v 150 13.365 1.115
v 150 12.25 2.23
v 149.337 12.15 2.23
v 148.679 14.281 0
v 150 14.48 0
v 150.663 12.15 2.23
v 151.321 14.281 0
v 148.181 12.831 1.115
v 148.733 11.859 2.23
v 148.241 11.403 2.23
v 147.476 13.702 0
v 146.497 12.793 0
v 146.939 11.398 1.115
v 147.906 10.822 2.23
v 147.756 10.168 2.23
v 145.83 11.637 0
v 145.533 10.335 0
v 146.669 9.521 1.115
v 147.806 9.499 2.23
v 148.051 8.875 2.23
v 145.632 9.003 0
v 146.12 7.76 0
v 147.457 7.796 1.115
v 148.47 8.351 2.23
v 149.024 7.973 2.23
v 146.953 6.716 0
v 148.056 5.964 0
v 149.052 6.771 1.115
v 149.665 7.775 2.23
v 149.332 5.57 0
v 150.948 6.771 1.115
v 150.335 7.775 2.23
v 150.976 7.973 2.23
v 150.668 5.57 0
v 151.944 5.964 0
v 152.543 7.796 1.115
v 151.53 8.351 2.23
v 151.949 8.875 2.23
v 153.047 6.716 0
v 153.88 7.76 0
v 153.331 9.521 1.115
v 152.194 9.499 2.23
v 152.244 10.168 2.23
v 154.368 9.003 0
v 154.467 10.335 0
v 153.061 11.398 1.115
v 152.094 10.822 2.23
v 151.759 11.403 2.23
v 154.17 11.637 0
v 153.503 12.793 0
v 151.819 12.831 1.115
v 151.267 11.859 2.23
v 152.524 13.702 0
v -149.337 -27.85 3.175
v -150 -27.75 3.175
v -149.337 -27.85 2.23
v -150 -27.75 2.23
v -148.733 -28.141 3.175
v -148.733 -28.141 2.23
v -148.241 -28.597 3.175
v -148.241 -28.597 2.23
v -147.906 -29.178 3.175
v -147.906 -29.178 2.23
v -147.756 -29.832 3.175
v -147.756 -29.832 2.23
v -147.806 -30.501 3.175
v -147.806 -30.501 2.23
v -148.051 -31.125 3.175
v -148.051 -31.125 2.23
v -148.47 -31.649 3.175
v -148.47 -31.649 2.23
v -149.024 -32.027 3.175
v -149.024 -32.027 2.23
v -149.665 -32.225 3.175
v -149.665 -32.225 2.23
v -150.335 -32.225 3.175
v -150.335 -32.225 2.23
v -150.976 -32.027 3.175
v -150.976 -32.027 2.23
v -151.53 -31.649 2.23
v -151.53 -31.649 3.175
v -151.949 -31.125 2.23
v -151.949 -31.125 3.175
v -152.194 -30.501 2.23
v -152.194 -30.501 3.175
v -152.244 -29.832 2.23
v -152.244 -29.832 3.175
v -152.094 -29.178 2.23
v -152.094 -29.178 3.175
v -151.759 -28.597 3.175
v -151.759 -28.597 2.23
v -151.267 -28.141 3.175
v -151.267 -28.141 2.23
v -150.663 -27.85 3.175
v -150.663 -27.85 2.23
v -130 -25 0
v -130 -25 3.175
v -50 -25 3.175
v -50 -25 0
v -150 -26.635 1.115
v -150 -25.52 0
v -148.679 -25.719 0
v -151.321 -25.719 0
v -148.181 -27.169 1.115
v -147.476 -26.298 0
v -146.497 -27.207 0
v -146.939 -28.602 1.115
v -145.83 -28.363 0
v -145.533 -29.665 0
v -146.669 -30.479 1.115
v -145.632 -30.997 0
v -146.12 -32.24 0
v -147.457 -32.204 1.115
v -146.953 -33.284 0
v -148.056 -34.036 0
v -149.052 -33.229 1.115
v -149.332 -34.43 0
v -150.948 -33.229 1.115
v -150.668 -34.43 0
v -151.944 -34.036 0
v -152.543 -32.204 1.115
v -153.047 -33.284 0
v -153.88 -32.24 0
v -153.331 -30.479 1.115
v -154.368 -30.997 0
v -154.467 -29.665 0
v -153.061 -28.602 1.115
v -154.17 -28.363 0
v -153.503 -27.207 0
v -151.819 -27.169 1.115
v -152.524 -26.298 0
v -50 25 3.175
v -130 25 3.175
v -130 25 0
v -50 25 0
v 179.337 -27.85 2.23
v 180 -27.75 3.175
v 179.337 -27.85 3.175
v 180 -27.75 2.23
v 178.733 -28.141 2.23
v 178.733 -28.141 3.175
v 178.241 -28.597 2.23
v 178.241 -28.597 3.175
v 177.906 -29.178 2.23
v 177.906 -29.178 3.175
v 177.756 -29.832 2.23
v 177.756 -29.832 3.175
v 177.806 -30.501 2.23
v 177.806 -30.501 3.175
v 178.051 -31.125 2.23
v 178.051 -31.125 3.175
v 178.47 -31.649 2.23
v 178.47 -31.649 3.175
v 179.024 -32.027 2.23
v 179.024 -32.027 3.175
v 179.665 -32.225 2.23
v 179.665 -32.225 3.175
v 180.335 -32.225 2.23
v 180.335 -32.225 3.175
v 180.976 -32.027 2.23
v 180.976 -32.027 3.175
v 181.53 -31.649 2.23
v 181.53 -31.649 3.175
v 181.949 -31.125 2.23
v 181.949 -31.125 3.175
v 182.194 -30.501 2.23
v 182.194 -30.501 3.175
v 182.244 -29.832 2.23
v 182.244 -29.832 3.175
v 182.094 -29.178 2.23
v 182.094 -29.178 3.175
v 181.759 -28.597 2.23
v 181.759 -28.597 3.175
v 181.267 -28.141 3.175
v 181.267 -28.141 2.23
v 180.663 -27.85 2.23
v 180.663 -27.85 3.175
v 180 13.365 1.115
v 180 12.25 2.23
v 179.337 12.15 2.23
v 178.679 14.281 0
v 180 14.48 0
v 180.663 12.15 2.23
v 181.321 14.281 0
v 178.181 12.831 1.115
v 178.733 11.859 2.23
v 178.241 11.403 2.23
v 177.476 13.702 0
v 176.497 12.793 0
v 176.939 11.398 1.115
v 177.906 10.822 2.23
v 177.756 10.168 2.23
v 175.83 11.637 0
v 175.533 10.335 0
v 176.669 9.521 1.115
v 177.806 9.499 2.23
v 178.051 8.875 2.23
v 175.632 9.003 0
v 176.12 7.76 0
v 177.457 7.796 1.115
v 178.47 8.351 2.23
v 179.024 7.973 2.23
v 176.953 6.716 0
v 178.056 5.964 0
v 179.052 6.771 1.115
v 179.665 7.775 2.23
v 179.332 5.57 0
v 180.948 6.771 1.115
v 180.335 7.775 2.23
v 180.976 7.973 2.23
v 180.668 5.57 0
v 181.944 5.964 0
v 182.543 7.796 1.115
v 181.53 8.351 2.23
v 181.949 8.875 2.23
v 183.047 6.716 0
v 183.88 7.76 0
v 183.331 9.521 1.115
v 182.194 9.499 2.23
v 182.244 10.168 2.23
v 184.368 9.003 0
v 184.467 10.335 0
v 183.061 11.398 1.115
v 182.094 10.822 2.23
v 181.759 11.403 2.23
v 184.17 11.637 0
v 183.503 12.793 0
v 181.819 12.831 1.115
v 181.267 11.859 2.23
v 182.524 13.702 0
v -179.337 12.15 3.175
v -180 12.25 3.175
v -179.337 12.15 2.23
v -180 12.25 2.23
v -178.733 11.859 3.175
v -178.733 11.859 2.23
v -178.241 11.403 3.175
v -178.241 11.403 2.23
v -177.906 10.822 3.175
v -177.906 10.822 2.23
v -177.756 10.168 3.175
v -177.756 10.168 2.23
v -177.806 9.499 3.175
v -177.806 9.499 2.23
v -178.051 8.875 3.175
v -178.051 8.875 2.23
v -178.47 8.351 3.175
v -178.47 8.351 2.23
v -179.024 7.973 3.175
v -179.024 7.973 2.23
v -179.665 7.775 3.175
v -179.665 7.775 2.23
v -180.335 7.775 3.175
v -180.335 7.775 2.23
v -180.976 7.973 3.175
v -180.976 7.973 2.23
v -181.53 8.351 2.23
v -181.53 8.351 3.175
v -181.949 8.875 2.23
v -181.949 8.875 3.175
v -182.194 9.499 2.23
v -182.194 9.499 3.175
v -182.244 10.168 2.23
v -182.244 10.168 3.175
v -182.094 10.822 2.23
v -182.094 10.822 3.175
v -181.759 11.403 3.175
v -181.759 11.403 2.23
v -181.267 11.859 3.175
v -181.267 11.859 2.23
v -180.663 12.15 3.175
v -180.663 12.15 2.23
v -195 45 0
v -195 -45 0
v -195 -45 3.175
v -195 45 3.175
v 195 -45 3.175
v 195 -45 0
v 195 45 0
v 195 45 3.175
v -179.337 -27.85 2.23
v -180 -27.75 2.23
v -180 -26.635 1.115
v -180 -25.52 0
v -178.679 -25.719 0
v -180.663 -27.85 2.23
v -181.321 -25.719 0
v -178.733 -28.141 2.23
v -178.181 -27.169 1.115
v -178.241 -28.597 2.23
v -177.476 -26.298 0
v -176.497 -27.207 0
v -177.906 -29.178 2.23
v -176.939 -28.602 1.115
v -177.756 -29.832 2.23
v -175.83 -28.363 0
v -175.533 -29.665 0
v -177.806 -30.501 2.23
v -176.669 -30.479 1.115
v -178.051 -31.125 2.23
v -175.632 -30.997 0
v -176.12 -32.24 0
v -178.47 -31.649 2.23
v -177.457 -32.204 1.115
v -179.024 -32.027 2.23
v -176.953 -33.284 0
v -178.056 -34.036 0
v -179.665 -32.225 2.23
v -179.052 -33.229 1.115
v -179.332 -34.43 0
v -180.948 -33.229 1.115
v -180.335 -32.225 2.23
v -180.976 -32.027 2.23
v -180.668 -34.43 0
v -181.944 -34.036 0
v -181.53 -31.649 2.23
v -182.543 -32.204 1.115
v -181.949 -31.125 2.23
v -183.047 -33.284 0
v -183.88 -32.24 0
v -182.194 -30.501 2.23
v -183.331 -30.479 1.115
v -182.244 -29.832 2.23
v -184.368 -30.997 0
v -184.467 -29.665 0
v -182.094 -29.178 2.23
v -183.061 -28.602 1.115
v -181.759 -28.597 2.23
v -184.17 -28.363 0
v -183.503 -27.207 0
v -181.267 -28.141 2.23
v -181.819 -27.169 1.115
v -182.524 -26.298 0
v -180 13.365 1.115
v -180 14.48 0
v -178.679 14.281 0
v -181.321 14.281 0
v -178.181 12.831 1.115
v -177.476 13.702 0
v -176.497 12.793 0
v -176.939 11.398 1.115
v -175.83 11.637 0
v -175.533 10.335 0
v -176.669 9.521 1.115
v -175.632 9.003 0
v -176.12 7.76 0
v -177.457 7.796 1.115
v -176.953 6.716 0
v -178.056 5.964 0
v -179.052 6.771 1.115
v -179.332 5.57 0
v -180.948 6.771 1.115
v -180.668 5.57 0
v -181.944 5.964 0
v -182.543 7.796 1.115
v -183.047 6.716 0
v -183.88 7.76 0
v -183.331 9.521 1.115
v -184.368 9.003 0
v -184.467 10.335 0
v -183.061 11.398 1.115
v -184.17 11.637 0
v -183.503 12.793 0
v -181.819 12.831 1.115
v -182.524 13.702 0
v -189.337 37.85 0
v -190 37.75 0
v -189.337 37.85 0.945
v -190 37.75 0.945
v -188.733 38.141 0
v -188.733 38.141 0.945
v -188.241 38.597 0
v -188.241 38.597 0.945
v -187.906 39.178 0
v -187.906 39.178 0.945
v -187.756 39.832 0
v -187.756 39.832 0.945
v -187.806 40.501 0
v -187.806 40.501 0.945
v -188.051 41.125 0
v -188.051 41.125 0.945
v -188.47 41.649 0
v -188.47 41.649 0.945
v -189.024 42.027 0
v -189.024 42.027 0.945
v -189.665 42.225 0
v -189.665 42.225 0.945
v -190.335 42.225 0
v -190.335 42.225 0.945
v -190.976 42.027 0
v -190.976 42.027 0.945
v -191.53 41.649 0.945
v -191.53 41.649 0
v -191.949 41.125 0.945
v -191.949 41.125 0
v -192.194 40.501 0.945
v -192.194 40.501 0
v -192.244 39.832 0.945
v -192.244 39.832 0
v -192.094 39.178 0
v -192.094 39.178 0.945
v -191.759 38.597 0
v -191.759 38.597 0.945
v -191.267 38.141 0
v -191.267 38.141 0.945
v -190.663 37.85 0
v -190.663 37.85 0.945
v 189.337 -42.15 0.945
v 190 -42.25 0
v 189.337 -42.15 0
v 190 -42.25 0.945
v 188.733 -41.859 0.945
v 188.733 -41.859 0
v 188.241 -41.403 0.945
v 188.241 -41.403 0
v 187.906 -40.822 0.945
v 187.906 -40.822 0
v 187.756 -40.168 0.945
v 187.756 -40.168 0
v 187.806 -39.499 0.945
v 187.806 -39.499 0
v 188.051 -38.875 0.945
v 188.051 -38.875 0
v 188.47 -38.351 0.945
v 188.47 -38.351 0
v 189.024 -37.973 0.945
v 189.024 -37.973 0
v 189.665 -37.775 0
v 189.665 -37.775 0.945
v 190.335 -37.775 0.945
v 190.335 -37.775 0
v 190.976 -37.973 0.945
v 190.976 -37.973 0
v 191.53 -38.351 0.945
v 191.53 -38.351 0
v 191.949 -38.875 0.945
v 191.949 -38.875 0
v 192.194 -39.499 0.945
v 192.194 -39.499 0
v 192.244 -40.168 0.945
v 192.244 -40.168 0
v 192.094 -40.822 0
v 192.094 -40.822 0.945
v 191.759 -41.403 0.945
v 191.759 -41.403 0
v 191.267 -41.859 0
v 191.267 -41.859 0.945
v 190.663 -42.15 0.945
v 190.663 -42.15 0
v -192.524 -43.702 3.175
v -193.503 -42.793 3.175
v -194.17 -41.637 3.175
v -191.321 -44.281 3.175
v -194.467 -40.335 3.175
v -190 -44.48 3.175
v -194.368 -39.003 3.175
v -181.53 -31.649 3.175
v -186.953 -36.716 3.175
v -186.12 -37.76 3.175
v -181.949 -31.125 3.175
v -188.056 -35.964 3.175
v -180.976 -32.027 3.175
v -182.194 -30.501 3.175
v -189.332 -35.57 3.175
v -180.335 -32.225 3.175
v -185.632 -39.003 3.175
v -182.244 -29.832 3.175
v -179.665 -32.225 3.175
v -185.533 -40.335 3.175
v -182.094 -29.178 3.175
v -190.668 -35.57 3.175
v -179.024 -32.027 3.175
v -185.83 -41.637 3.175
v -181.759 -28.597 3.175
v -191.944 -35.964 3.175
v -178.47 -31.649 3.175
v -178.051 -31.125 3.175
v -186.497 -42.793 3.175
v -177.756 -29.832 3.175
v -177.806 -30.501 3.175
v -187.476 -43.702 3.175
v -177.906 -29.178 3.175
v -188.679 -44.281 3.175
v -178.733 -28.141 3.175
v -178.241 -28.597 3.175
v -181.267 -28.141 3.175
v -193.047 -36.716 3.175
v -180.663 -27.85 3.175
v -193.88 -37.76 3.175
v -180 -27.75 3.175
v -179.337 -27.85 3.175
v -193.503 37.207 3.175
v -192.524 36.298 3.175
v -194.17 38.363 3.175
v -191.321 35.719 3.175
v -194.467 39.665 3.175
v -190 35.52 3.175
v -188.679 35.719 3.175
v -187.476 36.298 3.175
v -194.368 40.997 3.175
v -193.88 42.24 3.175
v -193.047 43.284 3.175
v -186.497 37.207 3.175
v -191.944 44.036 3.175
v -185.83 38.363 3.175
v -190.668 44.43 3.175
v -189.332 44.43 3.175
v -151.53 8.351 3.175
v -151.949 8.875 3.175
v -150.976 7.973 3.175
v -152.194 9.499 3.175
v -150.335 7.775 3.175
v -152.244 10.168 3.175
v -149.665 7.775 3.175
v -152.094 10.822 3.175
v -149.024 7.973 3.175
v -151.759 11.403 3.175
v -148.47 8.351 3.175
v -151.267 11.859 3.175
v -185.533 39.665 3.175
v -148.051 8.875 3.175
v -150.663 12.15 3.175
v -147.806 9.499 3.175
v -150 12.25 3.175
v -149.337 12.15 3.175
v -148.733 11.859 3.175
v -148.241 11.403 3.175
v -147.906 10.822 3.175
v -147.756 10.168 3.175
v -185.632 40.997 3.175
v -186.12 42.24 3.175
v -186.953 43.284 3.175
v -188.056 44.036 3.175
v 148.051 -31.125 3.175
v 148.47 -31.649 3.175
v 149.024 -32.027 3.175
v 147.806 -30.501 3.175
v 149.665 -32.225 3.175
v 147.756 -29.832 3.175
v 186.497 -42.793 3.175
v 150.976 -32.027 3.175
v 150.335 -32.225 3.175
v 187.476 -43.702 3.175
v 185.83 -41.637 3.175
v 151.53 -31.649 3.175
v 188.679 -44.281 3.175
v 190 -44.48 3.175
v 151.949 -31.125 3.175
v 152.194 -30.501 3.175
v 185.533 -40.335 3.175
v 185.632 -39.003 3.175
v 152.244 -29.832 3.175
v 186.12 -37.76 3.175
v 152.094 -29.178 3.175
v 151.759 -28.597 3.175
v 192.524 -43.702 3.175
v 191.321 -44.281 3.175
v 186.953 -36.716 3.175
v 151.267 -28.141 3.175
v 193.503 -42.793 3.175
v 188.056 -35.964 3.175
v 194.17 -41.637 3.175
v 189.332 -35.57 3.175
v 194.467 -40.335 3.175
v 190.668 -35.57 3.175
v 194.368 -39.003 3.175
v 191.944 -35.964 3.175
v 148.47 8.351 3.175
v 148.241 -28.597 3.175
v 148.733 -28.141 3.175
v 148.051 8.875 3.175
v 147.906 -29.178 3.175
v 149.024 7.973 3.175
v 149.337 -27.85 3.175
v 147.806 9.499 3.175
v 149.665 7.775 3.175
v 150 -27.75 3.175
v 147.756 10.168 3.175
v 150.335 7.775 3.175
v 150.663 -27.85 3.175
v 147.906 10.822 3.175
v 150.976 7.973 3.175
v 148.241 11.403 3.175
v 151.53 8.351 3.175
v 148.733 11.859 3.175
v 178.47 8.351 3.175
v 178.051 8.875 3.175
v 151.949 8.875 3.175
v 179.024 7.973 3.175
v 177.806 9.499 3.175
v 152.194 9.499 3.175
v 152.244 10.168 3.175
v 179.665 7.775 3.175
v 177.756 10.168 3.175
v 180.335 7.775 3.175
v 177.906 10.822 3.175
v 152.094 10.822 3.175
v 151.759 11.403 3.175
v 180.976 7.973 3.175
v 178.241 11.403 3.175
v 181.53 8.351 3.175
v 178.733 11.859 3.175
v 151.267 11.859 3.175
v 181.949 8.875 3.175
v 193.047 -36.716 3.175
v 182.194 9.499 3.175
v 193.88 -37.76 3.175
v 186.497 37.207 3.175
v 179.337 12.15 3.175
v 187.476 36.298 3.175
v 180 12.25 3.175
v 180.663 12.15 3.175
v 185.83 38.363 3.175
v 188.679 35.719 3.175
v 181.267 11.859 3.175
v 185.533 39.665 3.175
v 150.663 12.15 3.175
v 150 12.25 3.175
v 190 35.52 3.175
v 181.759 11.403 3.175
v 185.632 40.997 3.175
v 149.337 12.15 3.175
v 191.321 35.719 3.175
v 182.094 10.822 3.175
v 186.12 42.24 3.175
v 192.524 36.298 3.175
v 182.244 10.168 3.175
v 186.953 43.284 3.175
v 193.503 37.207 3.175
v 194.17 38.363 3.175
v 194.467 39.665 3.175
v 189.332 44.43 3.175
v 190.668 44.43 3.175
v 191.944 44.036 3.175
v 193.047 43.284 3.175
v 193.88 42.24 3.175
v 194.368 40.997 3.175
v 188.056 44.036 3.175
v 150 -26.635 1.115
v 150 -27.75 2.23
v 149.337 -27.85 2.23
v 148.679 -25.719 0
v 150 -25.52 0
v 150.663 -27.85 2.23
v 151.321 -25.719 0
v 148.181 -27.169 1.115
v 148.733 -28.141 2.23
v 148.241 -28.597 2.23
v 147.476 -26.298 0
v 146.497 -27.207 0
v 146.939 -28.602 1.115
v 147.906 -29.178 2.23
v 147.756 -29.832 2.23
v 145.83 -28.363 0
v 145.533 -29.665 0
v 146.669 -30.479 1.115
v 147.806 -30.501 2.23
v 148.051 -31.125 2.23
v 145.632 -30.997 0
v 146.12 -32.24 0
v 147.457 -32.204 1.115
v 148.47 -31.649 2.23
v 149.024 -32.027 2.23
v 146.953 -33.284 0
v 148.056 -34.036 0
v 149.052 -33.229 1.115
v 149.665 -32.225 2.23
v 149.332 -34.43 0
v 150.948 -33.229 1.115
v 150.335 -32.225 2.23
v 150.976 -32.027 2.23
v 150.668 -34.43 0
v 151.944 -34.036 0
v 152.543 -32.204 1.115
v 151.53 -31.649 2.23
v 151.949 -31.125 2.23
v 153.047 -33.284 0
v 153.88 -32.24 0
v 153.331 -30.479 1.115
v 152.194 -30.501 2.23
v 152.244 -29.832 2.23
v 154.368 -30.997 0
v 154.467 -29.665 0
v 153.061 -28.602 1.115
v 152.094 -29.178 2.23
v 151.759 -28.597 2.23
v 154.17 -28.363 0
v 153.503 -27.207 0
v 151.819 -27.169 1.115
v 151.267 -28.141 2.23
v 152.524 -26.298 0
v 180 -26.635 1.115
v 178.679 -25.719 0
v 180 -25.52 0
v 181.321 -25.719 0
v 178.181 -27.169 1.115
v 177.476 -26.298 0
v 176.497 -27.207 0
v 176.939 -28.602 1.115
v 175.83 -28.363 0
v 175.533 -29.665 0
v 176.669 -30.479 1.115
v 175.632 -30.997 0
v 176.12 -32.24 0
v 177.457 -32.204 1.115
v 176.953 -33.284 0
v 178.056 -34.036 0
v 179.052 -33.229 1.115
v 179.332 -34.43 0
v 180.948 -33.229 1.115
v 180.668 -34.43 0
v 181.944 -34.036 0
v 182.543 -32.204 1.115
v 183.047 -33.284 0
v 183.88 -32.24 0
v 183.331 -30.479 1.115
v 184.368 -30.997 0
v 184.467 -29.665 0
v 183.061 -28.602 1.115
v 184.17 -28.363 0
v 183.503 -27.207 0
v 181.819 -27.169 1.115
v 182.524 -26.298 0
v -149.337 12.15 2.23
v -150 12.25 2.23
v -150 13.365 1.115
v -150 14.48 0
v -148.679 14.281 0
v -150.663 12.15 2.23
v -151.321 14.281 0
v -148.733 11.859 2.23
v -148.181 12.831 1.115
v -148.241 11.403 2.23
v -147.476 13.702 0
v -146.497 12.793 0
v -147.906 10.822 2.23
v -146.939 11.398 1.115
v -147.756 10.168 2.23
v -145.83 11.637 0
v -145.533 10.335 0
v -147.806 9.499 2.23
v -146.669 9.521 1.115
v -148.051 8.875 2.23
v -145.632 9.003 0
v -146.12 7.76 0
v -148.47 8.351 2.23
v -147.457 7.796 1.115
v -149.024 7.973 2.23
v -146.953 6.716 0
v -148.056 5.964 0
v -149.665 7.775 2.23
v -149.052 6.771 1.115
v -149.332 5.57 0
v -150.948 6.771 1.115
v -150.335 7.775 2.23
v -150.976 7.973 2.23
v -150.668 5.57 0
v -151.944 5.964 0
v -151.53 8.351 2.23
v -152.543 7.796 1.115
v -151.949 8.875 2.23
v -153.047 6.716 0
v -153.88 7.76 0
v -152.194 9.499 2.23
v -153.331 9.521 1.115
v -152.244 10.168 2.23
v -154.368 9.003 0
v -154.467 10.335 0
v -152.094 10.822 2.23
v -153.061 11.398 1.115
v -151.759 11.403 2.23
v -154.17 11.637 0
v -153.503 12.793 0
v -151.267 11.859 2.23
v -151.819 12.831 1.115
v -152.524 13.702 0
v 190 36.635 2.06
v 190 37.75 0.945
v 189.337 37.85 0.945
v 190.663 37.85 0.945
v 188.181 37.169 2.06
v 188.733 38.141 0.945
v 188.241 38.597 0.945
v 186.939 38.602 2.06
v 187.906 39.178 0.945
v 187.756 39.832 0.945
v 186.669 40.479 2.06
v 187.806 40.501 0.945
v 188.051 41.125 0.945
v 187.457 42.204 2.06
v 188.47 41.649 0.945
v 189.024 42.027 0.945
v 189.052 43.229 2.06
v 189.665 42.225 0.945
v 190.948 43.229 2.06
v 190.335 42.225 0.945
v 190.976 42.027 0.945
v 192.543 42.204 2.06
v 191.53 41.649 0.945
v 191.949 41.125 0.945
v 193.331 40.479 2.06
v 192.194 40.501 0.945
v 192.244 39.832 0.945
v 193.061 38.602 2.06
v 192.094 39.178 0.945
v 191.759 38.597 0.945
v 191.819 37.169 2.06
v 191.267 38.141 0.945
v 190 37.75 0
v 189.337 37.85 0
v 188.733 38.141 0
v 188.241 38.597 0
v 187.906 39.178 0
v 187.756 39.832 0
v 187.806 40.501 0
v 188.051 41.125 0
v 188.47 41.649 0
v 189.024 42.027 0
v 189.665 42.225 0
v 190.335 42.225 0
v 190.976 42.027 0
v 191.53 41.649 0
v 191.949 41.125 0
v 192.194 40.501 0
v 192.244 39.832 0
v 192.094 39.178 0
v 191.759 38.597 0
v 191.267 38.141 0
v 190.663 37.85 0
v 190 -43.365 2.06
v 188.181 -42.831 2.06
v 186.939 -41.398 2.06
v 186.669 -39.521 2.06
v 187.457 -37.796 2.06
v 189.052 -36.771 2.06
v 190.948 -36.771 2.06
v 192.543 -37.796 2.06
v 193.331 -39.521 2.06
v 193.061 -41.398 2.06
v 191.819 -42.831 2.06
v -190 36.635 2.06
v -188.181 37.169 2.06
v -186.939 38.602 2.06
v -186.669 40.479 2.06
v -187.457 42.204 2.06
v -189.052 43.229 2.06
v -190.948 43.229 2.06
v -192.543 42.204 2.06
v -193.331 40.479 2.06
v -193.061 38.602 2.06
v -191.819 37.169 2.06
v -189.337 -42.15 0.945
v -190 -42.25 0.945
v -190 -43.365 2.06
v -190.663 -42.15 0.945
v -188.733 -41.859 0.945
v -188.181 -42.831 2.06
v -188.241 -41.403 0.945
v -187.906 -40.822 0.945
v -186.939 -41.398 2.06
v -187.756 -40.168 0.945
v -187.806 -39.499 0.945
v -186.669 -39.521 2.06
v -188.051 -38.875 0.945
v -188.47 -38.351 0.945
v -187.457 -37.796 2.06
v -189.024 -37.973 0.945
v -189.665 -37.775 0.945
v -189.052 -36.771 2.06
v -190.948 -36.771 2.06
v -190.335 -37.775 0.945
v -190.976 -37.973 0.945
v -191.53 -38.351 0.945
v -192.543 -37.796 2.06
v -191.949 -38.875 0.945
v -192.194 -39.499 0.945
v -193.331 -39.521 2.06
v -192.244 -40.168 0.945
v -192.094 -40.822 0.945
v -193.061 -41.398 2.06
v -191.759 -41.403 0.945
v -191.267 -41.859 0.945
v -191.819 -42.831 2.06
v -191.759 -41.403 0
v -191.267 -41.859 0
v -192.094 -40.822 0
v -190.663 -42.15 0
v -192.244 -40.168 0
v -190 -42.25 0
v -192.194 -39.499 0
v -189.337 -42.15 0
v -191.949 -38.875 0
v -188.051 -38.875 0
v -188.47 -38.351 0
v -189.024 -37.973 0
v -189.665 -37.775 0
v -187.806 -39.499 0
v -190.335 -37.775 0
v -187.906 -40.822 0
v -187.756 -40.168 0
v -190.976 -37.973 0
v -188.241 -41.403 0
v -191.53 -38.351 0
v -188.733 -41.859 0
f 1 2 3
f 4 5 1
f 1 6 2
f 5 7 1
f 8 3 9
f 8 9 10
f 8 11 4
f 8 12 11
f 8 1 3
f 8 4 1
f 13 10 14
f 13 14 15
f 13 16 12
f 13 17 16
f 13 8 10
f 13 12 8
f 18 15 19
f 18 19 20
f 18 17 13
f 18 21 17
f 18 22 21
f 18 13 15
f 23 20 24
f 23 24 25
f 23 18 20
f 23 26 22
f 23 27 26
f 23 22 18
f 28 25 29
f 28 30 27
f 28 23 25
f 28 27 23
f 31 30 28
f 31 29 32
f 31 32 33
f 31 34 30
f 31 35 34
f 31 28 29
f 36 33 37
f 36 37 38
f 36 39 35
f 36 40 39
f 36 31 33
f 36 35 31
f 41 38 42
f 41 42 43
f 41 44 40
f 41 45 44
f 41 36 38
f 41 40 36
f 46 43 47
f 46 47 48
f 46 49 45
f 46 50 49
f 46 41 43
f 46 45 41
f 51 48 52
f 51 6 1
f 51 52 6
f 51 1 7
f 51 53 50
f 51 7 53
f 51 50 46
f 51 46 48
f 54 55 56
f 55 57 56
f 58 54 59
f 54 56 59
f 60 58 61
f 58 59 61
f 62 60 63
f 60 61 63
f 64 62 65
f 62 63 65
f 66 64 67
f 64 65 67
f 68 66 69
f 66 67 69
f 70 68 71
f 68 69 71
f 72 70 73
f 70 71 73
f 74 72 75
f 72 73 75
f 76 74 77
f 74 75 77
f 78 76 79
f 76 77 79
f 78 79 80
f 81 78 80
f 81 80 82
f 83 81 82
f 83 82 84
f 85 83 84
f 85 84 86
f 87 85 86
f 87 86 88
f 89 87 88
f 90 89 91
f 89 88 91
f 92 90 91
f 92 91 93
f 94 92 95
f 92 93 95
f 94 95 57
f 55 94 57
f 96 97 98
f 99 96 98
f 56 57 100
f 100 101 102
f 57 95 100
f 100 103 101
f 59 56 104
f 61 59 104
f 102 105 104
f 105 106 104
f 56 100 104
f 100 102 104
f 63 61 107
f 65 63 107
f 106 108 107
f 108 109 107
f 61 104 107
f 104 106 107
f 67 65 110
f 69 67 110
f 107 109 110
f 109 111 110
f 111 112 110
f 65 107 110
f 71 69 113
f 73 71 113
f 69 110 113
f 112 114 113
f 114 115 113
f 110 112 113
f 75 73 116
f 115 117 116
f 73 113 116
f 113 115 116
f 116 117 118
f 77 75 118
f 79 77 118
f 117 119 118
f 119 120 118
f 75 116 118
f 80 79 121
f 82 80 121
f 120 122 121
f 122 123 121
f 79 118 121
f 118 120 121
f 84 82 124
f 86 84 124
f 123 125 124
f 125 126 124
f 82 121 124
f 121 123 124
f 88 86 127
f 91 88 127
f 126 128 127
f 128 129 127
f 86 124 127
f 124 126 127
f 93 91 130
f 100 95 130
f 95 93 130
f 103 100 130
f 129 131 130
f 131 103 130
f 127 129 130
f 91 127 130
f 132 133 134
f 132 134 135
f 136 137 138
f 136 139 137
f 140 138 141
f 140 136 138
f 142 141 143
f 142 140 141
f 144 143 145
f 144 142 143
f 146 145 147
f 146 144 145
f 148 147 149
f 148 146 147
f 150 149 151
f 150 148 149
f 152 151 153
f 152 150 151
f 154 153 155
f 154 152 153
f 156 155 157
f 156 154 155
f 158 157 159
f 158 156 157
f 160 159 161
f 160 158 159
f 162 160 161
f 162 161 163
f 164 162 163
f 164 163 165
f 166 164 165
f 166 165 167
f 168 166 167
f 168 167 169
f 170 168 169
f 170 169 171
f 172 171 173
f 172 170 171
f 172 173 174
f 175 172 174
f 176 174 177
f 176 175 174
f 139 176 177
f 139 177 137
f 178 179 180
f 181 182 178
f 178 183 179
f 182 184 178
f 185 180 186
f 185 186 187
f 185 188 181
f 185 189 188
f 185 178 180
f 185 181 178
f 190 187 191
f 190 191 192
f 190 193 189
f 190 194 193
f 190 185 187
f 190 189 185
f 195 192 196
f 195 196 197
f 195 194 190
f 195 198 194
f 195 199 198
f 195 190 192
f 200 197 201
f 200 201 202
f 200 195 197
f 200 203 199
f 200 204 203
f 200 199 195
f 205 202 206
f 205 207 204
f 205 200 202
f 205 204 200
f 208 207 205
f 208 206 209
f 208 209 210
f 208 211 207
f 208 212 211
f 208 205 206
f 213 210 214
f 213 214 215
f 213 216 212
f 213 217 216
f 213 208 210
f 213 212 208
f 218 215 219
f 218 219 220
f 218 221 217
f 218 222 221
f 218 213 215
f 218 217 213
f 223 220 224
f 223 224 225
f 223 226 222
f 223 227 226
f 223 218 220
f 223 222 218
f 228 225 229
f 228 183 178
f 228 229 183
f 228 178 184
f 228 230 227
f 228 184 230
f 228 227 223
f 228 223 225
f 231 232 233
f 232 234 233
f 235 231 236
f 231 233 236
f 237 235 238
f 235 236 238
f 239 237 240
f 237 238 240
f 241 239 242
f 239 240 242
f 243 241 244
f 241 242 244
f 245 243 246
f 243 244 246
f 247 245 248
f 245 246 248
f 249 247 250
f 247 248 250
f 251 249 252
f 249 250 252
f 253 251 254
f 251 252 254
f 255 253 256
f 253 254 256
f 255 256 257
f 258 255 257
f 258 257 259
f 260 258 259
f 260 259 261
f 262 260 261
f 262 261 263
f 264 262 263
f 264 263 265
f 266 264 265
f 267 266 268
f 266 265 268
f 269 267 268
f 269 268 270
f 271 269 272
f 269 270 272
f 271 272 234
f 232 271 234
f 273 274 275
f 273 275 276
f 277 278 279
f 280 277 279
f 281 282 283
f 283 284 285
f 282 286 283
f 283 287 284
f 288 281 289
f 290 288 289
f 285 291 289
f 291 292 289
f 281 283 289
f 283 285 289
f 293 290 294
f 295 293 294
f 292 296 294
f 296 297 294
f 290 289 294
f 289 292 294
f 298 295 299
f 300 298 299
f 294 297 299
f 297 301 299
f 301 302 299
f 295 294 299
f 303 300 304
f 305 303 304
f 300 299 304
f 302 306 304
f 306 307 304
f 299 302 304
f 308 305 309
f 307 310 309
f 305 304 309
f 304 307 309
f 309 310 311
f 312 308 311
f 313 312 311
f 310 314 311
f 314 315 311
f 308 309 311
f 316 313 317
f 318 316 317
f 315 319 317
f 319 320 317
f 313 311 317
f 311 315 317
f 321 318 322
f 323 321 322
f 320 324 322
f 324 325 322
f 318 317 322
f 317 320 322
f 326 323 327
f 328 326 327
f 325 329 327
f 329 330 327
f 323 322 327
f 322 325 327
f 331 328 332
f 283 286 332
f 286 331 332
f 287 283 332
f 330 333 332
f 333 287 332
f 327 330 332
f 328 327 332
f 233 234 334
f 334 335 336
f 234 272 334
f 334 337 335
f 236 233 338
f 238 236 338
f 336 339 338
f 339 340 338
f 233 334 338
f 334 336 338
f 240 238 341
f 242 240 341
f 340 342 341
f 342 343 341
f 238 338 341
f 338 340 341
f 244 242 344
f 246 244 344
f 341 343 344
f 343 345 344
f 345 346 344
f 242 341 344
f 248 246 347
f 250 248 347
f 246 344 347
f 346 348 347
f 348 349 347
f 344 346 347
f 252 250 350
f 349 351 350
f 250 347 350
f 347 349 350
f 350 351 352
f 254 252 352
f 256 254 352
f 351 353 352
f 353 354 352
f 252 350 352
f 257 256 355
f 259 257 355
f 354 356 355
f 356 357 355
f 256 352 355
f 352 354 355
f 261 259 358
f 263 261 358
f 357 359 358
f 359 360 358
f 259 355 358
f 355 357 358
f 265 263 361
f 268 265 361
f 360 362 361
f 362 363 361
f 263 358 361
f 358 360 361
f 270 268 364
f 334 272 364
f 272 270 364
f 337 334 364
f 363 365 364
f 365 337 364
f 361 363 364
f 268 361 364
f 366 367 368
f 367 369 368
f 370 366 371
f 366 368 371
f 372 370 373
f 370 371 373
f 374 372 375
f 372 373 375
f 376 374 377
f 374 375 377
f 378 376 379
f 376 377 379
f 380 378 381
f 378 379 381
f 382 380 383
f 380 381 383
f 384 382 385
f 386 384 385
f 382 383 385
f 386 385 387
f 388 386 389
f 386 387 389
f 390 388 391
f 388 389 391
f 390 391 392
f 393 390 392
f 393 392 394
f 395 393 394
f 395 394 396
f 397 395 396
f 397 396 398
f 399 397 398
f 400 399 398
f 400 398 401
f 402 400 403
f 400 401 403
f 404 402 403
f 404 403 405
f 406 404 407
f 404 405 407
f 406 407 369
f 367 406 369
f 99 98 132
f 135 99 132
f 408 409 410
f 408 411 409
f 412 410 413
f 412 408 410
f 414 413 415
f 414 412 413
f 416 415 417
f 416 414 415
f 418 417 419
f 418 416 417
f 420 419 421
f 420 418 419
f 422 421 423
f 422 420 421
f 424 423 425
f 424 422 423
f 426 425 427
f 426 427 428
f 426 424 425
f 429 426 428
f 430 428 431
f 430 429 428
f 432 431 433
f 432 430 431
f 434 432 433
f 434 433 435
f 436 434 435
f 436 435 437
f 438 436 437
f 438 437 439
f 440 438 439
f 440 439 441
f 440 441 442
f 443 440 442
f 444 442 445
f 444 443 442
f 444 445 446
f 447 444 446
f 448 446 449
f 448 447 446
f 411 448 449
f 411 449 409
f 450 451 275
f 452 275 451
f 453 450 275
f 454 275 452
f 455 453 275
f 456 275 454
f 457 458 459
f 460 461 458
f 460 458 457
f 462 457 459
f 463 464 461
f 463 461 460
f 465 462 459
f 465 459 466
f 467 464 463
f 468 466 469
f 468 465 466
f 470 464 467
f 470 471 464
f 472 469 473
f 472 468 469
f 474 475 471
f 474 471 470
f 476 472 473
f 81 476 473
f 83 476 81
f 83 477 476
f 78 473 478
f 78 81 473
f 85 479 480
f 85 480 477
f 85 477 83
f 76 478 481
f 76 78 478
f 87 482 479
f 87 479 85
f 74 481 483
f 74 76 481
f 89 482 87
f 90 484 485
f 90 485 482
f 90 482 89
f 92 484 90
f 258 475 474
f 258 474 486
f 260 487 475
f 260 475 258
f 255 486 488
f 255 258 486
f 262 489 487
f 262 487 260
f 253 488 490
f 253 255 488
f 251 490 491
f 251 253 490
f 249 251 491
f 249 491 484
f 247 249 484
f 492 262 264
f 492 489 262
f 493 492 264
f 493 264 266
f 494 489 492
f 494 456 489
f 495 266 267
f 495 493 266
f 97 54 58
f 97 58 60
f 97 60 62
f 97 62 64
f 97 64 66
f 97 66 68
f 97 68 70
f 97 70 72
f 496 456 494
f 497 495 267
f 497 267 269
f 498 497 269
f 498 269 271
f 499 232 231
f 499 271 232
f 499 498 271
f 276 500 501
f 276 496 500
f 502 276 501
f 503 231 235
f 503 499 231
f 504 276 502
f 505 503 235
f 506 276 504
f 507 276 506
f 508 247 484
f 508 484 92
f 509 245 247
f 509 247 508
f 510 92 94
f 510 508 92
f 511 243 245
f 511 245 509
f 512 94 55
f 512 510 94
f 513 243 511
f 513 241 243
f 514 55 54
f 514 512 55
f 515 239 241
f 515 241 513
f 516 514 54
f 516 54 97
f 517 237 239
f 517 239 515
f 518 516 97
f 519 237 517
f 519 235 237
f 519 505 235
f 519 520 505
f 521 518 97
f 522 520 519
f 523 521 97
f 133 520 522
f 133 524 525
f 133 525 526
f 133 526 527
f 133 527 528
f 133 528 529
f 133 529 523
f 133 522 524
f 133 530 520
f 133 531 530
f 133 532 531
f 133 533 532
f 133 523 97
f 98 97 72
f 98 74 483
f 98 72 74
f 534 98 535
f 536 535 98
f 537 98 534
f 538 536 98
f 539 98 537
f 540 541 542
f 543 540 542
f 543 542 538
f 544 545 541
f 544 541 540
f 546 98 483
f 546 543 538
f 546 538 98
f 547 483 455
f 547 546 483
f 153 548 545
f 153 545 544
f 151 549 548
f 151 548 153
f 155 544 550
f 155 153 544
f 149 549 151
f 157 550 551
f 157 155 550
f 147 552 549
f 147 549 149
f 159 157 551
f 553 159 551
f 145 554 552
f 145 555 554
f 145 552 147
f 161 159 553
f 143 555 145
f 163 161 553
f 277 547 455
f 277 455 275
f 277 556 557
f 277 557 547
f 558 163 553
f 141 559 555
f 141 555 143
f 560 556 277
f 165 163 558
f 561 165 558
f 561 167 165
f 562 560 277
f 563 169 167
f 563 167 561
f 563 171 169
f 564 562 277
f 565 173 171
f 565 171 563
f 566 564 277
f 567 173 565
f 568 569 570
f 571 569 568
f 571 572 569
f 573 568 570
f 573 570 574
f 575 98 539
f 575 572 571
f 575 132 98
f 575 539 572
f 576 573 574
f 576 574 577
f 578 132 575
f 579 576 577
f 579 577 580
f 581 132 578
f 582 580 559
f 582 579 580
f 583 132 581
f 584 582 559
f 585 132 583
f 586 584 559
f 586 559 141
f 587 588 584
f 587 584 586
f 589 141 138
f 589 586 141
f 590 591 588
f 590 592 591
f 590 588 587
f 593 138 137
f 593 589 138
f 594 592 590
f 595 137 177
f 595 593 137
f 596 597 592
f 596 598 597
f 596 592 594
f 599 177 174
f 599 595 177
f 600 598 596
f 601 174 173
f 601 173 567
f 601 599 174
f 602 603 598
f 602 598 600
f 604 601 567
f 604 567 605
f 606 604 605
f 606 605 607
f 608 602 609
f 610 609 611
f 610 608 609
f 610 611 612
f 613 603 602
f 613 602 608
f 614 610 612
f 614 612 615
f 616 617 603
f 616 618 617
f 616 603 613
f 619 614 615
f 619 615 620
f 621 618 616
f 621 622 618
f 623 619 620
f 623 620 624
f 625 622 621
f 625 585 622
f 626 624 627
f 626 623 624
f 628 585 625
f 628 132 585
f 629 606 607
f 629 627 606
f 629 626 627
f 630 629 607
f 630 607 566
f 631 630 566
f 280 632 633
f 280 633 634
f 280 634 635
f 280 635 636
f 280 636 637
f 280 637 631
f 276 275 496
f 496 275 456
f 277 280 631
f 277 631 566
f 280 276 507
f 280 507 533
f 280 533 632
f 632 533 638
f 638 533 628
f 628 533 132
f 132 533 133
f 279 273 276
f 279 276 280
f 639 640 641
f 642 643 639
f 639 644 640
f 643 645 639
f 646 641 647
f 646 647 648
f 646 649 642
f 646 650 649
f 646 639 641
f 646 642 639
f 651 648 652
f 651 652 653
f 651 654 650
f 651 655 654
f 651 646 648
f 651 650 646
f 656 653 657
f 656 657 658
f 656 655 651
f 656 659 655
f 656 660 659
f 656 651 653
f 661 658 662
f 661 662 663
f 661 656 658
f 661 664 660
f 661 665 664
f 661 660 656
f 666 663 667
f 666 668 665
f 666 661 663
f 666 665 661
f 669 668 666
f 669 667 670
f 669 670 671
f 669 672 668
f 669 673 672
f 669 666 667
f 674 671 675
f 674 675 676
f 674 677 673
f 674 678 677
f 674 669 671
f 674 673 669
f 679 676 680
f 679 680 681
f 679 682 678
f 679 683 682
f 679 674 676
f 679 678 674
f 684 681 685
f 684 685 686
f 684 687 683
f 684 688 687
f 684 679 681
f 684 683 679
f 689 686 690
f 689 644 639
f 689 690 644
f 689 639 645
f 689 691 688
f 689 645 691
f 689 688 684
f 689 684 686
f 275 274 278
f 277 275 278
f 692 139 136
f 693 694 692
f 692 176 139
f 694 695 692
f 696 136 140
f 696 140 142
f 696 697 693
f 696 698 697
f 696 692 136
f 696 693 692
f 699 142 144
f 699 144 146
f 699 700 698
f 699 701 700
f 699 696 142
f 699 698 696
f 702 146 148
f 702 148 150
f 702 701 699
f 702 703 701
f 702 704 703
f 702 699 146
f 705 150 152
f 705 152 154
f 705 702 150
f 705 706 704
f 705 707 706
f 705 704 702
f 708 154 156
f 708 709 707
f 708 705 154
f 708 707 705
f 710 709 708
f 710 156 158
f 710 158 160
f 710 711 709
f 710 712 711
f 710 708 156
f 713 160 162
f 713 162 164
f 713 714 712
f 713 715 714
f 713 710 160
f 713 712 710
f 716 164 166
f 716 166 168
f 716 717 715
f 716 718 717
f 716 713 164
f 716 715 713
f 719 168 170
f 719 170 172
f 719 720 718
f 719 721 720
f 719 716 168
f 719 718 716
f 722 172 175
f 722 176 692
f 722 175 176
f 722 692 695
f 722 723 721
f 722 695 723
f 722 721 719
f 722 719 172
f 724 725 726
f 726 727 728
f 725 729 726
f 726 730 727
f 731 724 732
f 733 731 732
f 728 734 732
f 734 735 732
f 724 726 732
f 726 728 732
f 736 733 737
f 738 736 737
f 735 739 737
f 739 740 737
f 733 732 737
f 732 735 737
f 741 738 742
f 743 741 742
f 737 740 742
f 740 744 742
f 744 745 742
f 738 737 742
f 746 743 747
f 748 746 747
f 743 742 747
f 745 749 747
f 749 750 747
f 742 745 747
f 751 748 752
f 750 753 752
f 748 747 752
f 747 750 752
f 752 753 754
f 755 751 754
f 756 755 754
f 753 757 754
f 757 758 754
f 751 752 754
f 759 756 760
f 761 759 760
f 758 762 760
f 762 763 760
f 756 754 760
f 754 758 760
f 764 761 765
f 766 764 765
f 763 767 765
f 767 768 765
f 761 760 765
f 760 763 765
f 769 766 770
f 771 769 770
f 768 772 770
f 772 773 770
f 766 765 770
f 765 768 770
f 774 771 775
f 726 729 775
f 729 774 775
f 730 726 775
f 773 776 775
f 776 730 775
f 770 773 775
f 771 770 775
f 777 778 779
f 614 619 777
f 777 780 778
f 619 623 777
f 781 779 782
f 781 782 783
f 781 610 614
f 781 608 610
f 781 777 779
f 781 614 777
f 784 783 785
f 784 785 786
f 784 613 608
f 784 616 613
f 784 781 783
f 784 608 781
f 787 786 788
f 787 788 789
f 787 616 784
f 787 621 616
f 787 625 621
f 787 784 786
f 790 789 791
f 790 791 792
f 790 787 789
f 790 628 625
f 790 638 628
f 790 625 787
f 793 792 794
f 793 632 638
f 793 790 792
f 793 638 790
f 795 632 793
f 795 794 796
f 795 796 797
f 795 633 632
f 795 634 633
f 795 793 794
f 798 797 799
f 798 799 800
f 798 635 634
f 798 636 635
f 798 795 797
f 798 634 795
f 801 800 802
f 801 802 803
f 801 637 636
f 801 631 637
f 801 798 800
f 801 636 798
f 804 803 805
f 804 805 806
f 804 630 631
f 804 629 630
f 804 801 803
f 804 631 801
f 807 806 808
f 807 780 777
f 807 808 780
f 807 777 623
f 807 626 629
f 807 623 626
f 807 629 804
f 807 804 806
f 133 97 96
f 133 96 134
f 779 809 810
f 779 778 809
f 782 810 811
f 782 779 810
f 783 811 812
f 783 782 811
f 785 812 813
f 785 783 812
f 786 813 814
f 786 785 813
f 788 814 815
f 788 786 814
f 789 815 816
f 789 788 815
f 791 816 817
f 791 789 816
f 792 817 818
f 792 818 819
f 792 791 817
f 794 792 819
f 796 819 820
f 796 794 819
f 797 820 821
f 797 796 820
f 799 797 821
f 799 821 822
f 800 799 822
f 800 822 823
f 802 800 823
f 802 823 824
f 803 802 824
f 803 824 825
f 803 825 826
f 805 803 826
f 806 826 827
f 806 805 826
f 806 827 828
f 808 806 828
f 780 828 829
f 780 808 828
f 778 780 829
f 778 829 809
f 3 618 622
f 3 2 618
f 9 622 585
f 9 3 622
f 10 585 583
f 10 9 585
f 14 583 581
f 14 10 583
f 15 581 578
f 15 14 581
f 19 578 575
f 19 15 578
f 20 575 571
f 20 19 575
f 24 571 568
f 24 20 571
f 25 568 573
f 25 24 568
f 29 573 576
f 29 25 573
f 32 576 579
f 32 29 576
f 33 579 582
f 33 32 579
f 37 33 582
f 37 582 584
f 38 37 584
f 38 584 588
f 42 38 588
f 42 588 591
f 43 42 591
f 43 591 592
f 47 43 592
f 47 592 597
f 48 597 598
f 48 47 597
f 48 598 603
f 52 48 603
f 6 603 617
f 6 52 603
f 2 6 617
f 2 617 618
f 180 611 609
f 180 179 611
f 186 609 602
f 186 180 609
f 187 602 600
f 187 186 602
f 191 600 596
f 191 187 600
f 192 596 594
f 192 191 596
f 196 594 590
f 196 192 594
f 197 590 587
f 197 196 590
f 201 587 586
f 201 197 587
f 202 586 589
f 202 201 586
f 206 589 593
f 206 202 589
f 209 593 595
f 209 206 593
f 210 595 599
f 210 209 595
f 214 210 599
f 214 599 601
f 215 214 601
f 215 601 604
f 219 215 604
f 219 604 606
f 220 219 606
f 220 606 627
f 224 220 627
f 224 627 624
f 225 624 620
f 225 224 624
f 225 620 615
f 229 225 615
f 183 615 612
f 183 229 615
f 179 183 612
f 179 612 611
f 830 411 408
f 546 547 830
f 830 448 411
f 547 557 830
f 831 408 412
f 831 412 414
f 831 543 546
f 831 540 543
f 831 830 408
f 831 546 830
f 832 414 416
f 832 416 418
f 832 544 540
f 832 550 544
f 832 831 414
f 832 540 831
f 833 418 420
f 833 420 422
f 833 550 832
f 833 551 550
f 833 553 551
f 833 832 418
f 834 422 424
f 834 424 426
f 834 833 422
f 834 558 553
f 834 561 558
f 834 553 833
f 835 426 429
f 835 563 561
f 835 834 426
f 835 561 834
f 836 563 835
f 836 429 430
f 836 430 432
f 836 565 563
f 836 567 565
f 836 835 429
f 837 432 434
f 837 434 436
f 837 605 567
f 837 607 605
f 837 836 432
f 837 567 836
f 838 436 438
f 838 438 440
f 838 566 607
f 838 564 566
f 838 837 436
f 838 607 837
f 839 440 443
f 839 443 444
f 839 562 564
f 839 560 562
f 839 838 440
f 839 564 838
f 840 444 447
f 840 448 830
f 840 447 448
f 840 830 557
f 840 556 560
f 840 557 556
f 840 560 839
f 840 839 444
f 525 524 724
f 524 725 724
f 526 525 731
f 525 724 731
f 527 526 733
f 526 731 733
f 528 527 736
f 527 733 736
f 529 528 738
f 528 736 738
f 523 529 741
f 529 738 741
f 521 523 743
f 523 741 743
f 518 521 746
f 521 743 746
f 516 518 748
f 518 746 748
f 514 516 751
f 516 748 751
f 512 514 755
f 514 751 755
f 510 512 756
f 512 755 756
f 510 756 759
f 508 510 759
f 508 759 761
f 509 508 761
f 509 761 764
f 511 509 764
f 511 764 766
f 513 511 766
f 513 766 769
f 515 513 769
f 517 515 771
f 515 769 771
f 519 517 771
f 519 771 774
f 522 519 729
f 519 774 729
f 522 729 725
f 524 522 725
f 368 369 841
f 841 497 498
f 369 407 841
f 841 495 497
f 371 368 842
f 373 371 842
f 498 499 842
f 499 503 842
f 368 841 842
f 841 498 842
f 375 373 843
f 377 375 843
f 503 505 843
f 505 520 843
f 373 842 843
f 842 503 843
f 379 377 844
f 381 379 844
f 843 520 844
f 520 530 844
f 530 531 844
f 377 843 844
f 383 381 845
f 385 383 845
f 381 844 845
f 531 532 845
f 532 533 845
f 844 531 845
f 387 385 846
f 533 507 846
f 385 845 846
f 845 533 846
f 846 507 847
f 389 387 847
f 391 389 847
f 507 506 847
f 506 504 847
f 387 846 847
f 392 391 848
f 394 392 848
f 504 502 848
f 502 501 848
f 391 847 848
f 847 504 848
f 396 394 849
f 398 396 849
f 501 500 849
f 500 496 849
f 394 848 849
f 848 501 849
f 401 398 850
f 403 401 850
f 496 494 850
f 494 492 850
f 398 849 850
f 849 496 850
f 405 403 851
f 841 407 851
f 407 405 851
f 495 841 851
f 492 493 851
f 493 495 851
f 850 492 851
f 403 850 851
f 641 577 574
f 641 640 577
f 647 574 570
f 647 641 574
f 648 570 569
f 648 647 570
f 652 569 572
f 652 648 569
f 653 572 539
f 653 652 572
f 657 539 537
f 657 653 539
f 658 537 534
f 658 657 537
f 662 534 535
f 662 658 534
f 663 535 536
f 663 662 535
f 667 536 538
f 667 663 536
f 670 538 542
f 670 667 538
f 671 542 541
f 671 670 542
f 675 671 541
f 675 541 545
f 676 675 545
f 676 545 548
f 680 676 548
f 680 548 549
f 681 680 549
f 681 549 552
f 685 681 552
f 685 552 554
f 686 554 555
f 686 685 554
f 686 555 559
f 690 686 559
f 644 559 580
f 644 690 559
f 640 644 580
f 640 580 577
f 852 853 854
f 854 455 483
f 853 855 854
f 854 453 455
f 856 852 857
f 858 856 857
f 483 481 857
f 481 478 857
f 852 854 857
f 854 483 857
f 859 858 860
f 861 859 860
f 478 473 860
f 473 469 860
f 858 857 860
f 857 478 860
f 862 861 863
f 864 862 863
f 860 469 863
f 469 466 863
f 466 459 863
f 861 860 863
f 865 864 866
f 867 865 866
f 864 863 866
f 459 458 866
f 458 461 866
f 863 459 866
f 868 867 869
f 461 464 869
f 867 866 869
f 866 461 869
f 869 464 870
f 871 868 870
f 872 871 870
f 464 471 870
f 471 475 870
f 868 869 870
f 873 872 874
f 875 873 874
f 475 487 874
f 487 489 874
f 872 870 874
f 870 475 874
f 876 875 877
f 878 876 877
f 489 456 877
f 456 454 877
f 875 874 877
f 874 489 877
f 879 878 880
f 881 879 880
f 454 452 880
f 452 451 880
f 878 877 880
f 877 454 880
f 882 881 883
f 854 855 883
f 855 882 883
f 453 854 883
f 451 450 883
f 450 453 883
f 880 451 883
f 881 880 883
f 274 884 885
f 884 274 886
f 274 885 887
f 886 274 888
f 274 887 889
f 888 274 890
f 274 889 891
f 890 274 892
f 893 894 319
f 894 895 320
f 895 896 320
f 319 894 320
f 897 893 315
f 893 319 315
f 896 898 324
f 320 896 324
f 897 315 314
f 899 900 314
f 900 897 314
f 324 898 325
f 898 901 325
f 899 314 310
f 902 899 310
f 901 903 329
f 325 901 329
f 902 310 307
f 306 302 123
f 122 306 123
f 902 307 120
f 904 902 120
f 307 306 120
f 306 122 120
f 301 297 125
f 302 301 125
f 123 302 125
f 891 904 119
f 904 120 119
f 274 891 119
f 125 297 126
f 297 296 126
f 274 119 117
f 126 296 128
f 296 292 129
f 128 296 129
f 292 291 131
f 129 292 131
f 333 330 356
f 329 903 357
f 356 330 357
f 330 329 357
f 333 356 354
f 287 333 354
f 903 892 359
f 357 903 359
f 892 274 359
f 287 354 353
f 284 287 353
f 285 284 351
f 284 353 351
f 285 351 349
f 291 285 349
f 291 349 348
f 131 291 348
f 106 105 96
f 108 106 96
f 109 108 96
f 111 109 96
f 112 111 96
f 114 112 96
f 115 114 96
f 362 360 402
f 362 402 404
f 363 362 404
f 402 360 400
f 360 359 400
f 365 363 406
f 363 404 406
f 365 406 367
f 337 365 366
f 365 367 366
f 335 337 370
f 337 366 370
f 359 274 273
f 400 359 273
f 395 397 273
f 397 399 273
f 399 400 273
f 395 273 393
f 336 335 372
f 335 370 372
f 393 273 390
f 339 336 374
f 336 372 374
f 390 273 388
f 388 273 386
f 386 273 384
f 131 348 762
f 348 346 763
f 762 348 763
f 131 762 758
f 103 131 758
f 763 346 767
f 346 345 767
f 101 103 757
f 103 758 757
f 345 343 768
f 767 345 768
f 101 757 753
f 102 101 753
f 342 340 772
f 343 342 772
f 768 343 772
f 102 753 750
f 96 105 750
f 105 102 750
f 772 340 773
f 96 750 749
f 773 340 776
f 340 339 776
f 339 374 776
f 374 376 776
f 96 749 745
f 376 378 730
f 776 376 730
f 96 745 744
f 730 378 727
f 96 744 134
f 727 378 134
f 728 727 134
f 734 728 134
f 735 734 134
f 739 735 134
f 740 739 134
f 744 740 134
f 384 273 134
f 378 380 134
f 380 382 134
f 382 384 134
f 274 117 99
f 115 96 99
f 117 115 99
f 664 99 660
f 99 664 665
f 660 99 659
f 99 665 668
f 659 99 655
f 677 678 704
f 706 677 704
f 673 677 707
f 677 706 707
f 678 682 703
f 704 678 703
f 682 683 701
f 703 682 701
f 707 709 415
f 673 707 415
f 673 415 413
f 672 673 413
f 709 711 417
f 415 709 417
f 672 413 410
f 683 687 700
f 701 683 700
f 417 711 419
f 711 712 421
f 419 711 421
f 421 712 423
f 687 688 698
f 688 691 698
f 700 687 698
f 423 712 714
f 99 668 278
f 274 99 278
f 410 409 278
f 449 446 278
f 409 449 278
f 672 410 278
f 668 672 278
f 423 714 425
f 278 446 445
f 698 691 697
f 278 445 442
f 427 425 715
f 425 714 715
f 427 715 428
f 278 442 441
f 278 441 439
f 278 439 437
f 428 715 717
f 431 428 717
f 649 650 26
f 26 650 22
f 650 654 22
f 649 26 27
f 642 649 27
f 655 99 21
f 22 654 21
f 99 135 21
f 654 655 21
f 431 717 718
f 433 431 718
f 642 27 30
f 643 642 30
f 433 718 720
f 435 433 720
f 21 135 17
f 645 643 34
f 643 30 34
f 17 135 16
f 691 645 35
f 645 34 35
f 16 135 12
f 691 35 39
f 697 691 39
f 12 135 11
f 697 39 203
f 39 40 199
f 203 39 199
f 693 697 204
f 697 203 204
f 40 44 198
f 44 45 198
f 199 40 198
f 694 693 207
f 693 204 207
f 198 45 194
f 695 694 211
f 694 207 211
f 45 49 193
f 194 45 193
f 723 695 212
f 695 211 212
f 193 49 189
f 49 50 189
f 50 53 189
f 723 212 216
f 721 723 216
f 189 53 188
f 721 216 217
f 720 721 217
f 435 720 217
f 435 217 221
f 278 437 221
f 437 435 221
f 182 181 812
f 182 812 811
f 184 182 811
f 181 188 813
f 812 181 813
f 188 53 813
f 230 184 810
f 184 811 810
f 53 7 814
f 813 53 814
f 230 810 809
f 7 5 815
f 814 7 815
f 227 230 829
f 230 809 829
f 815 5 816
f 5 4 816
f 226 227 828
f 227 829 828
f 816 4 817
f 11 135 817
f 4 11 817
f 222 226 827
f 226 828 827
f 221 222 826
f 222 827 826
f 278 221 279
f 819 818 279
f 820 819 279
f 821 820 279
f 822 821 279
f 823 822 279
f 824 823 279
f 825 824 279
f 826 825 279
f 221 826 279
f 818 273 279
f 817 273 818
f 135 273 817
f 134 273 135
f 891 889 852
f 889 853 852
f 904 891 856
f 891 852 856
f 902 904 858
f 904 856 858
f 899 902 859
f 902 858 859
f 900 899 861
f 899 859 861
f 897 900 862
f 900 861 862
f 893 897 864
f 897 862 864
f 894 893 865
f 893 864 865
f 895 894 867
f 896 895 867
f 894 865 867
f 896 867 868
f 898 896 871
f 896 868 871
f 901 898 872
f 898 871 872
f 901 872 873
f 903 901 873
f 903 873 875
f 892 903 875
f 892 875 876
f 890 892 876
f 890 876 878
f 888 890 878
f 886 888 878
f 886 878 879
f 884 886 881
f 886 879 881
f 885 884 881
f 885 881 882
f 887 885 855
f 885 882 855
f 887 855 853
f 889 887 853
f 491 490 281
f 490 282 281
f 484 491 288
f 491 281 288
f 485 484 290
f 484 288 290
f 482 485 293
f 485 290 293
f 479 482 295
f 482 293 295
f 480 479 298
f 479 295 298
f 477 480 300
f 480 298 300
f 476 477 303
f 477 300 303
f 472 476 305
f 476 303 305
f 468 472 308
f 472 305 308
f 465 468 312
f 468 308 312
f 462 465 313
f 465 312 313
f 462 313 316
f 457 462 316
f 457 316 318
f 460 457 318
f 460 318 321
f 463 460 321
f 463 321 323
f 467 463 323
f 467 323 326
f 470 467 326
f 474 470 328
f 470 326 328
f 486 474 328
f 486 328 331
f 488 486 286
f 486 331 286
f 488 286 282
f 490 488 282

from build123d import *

# Parameters (mm, degrees)
SKETCH1_W                    = 390
SKETCH1_H                    = 90
BOSS_EXTRUDE1_DEPTH          = 3.175
CSK_FOR_M4_SFHCS1_AT_2_COUNT = 2
CSK_FOR_M4_SFHCS1_AT_2_PITCH = 50
CSK_FOR_M4_SFHCS1_AT_3_COUNT = 2
CSK_FOR_M4_SFHCS1_AT_3_PITCH = 30
CSK_FOR_M4_SFHCS1_AT_4_COUNT = 2
CSK_FOR_M4_SFHCS1_AT_4_PITCH = 40
CSK_FOR_M4_SFHCS3_AT_2_COUNT = 2
CSK_FOR_M4_SFHCS3_AT_2_PITCH = 80
SKETCH8_W                    = 80
SKETCH8_H                    = 50
CUT_EXTRUDE1_DEPTH           = 3.175


with BuildPart() as part:
    # Sketch1 → Boss-Extrude1 (new body)
    with BuildSketch(Plane.XY):
        Rectangle(SKETCH1_W, SKETCH1_H)
    extrude(amount=BOSS_EXTRUDE1_DEPTH)

    # Sketch5 → CSK for M4 SFHCS1 (revolve, cut)
    with BuildSketch(Plane(origin=(150, 10, 0), x_dir=(0, 1, 0), z_dir=(1, 0, 0))):
        Polygon((0, 0), (0, 3.175), (2.25, 3.175), (2.25, 2.23), (4.48, 0), align=None)
    csk_for_m4_sfhcs1 = revolve(axis=Axis((150, 10, -6.35), (0, 0, 1)), mode=Mode.SUBTRACT)

    # CSK for M4 SFHCS1 at 2: CSK for M4 SFHCS1 ×2
    with Locations(*[Vector(0.6, -0.8, 0) * (i * CSK_FOR_M4_SFHCS1_AT_2_PITCH) for i in range(1, CSK_FOR_M4_SFHCS1_AT_2_COUNT)]):
        add(csk_for_m4_sfhcs1, mode=Mode.SUBTRACT)

    # CSK for M4 SFHCS1 at 3: CSK for M4 SFHCS1 ×2
    with Locations(*[(i * CSK_FOR_M4_SFHCS1_AT_3_PITCH, 0, 0) for i in range(1, CSK_FOR_M4_SFHCS1_AT_3_COUNT)]):
        add(csk_for_m4_sfhcs1, mode=Mode.SUBTRACT)

    # CSK for M4 SFHCS1 at 4: CSK for M4 SFHCS1 ×2
    with Locations(*[(0, -i * CSK_FOR_M4_SFHCS1_AT_4_PITCH, 0) for i in range(1, CSK_FOR_M4_SFHCS1_AT_4_COUNT)]):
        add(csk_for_m4_sfhcs1, mode=Mode.SUBTRACT)

    # Sketch7 → CSK for M4 SFHCS3 (revolve, cut)
    with BuildSketch(Plane(origin=(190, 40, 3.175), x_dir=(0, -1, 0), z_dir=(1, 0, 0))):
        Polygon((0, 0), (0, 3.175), (2.25, 3.175), (2.25, 2.23), (4.48, 0), align=None)
    csk_for_m4_sfhcs3 = revolve(axis=Axis((190, 40, 9.525), (0, 0, -1)), mode=Mode.SUBTRACT)

    # CSK for M4 SFHCS3 at 2: CSK for M4 SFHCS3 ×2
    with Locations(*[(0, -i * CSK_FOR_M4_SFHCS3_AT_2_PITCH, 0) for i in range(1, CSK_FOR_M4_SFHCS3_AT_2_COUNT)]):
        add(csk_for_m4_sfhcs3, mode=Mode.SUBTRACT)

    # Mirror1: CSK for M4 SFHCS1, CSK for M4 SFHCS3 across plane
    add(csk_for_m4_sfhcs1.mirror(Plane(origin=(0, 0, 0), x_dir=(0, 0, 1), z_dir=(1, 0, 0))), mode=Mode.SUBTRACT)
    add(csk_for_m4_sfhcs3.mirror(Plane(origin=(0, 0, 0), x_dir=(0, 0, 1), z_dir=(1, 0, 0))), mode=Mode.SUBTRACT)

    # Mirror1 copy 1 sketch → Mirror1 copy 1 (revolve, cut)
    with BuildSketch(Plane(origin=(-180, -30, 0), x_dir=(0, 1, 0), z_dir=(-1, 0, 0))):
        Polygon((0, 0), (0, -3.175), (2.25, -3.175), (2.25, -2.23), (4.48, 0), align=None)
    revolve(axis=Axis((-180, -30, -6.35), (0, 0, -1)), mode=Mode.SUBTRACT)

    # Mirror1 copy 2 sketch → Mirror1 copy 2 (revolve, cut)
    with BuildSketch(Plane(origin=(-180, 10, 0), x_dir=(0, 1, 0), z_dir=(-1, 0, 0))):
        Polygon((0, 0), (0, -3.175), (2.25, -3.175), (2.25, -2.23), (4.48, 0), align=None)
    revolve(axis=Axis((-180, 10, -6.35), (0, 0, -1)), mode=Mode.SUBTRACT)

    # Mirror1 copy 3 sketch → Mirror1 copy 3 (revolve, cut)
    with BuildSketch(Plane(origin=(-150, -30, 0), x_dir=(0, 1, 0), z_dir=(-1, 0, 0))):
        Polygon((0, 0), (0, -3.175), (2.25, -3.175), (2.25, -2.23), (4.48, 0), align=None)
    revolve(axis=Axis((-150, -30, -6.35), (0, 0, -1)), mode=Mode.SUBTRACT)

    # Mirror1 copy 4 sketch → Mirror1 copy 4 (revolve, cut)
    with BuildSketch(Plane(origin=(-190, -40, 3.175), x_dir=(0, -1, 0), z_dir=(-1, 0, 0))):
        Polygon((0, 0), (0, -3.175), (2.25, -3.175), (2.25, -2.23), (4.48, 0), align=None)
    revolve(axis=Axis((-190, -40, 9.525), (0, 0, 1)), mode=Mode.SUBTRACT)

    # Sketch8 → Cut-Extrude1 (cut)
    with BuildSketch(Plane.XY.offset(3.175)):
        with Locations((-90, 0)):
            Rectangle(SKETCH8_W, SKETCH8_H)
    extrude(amount=-CUT_EXTRUDE1_DEPTH, mode=Mode.SUBTRACT)


solid = part.part
